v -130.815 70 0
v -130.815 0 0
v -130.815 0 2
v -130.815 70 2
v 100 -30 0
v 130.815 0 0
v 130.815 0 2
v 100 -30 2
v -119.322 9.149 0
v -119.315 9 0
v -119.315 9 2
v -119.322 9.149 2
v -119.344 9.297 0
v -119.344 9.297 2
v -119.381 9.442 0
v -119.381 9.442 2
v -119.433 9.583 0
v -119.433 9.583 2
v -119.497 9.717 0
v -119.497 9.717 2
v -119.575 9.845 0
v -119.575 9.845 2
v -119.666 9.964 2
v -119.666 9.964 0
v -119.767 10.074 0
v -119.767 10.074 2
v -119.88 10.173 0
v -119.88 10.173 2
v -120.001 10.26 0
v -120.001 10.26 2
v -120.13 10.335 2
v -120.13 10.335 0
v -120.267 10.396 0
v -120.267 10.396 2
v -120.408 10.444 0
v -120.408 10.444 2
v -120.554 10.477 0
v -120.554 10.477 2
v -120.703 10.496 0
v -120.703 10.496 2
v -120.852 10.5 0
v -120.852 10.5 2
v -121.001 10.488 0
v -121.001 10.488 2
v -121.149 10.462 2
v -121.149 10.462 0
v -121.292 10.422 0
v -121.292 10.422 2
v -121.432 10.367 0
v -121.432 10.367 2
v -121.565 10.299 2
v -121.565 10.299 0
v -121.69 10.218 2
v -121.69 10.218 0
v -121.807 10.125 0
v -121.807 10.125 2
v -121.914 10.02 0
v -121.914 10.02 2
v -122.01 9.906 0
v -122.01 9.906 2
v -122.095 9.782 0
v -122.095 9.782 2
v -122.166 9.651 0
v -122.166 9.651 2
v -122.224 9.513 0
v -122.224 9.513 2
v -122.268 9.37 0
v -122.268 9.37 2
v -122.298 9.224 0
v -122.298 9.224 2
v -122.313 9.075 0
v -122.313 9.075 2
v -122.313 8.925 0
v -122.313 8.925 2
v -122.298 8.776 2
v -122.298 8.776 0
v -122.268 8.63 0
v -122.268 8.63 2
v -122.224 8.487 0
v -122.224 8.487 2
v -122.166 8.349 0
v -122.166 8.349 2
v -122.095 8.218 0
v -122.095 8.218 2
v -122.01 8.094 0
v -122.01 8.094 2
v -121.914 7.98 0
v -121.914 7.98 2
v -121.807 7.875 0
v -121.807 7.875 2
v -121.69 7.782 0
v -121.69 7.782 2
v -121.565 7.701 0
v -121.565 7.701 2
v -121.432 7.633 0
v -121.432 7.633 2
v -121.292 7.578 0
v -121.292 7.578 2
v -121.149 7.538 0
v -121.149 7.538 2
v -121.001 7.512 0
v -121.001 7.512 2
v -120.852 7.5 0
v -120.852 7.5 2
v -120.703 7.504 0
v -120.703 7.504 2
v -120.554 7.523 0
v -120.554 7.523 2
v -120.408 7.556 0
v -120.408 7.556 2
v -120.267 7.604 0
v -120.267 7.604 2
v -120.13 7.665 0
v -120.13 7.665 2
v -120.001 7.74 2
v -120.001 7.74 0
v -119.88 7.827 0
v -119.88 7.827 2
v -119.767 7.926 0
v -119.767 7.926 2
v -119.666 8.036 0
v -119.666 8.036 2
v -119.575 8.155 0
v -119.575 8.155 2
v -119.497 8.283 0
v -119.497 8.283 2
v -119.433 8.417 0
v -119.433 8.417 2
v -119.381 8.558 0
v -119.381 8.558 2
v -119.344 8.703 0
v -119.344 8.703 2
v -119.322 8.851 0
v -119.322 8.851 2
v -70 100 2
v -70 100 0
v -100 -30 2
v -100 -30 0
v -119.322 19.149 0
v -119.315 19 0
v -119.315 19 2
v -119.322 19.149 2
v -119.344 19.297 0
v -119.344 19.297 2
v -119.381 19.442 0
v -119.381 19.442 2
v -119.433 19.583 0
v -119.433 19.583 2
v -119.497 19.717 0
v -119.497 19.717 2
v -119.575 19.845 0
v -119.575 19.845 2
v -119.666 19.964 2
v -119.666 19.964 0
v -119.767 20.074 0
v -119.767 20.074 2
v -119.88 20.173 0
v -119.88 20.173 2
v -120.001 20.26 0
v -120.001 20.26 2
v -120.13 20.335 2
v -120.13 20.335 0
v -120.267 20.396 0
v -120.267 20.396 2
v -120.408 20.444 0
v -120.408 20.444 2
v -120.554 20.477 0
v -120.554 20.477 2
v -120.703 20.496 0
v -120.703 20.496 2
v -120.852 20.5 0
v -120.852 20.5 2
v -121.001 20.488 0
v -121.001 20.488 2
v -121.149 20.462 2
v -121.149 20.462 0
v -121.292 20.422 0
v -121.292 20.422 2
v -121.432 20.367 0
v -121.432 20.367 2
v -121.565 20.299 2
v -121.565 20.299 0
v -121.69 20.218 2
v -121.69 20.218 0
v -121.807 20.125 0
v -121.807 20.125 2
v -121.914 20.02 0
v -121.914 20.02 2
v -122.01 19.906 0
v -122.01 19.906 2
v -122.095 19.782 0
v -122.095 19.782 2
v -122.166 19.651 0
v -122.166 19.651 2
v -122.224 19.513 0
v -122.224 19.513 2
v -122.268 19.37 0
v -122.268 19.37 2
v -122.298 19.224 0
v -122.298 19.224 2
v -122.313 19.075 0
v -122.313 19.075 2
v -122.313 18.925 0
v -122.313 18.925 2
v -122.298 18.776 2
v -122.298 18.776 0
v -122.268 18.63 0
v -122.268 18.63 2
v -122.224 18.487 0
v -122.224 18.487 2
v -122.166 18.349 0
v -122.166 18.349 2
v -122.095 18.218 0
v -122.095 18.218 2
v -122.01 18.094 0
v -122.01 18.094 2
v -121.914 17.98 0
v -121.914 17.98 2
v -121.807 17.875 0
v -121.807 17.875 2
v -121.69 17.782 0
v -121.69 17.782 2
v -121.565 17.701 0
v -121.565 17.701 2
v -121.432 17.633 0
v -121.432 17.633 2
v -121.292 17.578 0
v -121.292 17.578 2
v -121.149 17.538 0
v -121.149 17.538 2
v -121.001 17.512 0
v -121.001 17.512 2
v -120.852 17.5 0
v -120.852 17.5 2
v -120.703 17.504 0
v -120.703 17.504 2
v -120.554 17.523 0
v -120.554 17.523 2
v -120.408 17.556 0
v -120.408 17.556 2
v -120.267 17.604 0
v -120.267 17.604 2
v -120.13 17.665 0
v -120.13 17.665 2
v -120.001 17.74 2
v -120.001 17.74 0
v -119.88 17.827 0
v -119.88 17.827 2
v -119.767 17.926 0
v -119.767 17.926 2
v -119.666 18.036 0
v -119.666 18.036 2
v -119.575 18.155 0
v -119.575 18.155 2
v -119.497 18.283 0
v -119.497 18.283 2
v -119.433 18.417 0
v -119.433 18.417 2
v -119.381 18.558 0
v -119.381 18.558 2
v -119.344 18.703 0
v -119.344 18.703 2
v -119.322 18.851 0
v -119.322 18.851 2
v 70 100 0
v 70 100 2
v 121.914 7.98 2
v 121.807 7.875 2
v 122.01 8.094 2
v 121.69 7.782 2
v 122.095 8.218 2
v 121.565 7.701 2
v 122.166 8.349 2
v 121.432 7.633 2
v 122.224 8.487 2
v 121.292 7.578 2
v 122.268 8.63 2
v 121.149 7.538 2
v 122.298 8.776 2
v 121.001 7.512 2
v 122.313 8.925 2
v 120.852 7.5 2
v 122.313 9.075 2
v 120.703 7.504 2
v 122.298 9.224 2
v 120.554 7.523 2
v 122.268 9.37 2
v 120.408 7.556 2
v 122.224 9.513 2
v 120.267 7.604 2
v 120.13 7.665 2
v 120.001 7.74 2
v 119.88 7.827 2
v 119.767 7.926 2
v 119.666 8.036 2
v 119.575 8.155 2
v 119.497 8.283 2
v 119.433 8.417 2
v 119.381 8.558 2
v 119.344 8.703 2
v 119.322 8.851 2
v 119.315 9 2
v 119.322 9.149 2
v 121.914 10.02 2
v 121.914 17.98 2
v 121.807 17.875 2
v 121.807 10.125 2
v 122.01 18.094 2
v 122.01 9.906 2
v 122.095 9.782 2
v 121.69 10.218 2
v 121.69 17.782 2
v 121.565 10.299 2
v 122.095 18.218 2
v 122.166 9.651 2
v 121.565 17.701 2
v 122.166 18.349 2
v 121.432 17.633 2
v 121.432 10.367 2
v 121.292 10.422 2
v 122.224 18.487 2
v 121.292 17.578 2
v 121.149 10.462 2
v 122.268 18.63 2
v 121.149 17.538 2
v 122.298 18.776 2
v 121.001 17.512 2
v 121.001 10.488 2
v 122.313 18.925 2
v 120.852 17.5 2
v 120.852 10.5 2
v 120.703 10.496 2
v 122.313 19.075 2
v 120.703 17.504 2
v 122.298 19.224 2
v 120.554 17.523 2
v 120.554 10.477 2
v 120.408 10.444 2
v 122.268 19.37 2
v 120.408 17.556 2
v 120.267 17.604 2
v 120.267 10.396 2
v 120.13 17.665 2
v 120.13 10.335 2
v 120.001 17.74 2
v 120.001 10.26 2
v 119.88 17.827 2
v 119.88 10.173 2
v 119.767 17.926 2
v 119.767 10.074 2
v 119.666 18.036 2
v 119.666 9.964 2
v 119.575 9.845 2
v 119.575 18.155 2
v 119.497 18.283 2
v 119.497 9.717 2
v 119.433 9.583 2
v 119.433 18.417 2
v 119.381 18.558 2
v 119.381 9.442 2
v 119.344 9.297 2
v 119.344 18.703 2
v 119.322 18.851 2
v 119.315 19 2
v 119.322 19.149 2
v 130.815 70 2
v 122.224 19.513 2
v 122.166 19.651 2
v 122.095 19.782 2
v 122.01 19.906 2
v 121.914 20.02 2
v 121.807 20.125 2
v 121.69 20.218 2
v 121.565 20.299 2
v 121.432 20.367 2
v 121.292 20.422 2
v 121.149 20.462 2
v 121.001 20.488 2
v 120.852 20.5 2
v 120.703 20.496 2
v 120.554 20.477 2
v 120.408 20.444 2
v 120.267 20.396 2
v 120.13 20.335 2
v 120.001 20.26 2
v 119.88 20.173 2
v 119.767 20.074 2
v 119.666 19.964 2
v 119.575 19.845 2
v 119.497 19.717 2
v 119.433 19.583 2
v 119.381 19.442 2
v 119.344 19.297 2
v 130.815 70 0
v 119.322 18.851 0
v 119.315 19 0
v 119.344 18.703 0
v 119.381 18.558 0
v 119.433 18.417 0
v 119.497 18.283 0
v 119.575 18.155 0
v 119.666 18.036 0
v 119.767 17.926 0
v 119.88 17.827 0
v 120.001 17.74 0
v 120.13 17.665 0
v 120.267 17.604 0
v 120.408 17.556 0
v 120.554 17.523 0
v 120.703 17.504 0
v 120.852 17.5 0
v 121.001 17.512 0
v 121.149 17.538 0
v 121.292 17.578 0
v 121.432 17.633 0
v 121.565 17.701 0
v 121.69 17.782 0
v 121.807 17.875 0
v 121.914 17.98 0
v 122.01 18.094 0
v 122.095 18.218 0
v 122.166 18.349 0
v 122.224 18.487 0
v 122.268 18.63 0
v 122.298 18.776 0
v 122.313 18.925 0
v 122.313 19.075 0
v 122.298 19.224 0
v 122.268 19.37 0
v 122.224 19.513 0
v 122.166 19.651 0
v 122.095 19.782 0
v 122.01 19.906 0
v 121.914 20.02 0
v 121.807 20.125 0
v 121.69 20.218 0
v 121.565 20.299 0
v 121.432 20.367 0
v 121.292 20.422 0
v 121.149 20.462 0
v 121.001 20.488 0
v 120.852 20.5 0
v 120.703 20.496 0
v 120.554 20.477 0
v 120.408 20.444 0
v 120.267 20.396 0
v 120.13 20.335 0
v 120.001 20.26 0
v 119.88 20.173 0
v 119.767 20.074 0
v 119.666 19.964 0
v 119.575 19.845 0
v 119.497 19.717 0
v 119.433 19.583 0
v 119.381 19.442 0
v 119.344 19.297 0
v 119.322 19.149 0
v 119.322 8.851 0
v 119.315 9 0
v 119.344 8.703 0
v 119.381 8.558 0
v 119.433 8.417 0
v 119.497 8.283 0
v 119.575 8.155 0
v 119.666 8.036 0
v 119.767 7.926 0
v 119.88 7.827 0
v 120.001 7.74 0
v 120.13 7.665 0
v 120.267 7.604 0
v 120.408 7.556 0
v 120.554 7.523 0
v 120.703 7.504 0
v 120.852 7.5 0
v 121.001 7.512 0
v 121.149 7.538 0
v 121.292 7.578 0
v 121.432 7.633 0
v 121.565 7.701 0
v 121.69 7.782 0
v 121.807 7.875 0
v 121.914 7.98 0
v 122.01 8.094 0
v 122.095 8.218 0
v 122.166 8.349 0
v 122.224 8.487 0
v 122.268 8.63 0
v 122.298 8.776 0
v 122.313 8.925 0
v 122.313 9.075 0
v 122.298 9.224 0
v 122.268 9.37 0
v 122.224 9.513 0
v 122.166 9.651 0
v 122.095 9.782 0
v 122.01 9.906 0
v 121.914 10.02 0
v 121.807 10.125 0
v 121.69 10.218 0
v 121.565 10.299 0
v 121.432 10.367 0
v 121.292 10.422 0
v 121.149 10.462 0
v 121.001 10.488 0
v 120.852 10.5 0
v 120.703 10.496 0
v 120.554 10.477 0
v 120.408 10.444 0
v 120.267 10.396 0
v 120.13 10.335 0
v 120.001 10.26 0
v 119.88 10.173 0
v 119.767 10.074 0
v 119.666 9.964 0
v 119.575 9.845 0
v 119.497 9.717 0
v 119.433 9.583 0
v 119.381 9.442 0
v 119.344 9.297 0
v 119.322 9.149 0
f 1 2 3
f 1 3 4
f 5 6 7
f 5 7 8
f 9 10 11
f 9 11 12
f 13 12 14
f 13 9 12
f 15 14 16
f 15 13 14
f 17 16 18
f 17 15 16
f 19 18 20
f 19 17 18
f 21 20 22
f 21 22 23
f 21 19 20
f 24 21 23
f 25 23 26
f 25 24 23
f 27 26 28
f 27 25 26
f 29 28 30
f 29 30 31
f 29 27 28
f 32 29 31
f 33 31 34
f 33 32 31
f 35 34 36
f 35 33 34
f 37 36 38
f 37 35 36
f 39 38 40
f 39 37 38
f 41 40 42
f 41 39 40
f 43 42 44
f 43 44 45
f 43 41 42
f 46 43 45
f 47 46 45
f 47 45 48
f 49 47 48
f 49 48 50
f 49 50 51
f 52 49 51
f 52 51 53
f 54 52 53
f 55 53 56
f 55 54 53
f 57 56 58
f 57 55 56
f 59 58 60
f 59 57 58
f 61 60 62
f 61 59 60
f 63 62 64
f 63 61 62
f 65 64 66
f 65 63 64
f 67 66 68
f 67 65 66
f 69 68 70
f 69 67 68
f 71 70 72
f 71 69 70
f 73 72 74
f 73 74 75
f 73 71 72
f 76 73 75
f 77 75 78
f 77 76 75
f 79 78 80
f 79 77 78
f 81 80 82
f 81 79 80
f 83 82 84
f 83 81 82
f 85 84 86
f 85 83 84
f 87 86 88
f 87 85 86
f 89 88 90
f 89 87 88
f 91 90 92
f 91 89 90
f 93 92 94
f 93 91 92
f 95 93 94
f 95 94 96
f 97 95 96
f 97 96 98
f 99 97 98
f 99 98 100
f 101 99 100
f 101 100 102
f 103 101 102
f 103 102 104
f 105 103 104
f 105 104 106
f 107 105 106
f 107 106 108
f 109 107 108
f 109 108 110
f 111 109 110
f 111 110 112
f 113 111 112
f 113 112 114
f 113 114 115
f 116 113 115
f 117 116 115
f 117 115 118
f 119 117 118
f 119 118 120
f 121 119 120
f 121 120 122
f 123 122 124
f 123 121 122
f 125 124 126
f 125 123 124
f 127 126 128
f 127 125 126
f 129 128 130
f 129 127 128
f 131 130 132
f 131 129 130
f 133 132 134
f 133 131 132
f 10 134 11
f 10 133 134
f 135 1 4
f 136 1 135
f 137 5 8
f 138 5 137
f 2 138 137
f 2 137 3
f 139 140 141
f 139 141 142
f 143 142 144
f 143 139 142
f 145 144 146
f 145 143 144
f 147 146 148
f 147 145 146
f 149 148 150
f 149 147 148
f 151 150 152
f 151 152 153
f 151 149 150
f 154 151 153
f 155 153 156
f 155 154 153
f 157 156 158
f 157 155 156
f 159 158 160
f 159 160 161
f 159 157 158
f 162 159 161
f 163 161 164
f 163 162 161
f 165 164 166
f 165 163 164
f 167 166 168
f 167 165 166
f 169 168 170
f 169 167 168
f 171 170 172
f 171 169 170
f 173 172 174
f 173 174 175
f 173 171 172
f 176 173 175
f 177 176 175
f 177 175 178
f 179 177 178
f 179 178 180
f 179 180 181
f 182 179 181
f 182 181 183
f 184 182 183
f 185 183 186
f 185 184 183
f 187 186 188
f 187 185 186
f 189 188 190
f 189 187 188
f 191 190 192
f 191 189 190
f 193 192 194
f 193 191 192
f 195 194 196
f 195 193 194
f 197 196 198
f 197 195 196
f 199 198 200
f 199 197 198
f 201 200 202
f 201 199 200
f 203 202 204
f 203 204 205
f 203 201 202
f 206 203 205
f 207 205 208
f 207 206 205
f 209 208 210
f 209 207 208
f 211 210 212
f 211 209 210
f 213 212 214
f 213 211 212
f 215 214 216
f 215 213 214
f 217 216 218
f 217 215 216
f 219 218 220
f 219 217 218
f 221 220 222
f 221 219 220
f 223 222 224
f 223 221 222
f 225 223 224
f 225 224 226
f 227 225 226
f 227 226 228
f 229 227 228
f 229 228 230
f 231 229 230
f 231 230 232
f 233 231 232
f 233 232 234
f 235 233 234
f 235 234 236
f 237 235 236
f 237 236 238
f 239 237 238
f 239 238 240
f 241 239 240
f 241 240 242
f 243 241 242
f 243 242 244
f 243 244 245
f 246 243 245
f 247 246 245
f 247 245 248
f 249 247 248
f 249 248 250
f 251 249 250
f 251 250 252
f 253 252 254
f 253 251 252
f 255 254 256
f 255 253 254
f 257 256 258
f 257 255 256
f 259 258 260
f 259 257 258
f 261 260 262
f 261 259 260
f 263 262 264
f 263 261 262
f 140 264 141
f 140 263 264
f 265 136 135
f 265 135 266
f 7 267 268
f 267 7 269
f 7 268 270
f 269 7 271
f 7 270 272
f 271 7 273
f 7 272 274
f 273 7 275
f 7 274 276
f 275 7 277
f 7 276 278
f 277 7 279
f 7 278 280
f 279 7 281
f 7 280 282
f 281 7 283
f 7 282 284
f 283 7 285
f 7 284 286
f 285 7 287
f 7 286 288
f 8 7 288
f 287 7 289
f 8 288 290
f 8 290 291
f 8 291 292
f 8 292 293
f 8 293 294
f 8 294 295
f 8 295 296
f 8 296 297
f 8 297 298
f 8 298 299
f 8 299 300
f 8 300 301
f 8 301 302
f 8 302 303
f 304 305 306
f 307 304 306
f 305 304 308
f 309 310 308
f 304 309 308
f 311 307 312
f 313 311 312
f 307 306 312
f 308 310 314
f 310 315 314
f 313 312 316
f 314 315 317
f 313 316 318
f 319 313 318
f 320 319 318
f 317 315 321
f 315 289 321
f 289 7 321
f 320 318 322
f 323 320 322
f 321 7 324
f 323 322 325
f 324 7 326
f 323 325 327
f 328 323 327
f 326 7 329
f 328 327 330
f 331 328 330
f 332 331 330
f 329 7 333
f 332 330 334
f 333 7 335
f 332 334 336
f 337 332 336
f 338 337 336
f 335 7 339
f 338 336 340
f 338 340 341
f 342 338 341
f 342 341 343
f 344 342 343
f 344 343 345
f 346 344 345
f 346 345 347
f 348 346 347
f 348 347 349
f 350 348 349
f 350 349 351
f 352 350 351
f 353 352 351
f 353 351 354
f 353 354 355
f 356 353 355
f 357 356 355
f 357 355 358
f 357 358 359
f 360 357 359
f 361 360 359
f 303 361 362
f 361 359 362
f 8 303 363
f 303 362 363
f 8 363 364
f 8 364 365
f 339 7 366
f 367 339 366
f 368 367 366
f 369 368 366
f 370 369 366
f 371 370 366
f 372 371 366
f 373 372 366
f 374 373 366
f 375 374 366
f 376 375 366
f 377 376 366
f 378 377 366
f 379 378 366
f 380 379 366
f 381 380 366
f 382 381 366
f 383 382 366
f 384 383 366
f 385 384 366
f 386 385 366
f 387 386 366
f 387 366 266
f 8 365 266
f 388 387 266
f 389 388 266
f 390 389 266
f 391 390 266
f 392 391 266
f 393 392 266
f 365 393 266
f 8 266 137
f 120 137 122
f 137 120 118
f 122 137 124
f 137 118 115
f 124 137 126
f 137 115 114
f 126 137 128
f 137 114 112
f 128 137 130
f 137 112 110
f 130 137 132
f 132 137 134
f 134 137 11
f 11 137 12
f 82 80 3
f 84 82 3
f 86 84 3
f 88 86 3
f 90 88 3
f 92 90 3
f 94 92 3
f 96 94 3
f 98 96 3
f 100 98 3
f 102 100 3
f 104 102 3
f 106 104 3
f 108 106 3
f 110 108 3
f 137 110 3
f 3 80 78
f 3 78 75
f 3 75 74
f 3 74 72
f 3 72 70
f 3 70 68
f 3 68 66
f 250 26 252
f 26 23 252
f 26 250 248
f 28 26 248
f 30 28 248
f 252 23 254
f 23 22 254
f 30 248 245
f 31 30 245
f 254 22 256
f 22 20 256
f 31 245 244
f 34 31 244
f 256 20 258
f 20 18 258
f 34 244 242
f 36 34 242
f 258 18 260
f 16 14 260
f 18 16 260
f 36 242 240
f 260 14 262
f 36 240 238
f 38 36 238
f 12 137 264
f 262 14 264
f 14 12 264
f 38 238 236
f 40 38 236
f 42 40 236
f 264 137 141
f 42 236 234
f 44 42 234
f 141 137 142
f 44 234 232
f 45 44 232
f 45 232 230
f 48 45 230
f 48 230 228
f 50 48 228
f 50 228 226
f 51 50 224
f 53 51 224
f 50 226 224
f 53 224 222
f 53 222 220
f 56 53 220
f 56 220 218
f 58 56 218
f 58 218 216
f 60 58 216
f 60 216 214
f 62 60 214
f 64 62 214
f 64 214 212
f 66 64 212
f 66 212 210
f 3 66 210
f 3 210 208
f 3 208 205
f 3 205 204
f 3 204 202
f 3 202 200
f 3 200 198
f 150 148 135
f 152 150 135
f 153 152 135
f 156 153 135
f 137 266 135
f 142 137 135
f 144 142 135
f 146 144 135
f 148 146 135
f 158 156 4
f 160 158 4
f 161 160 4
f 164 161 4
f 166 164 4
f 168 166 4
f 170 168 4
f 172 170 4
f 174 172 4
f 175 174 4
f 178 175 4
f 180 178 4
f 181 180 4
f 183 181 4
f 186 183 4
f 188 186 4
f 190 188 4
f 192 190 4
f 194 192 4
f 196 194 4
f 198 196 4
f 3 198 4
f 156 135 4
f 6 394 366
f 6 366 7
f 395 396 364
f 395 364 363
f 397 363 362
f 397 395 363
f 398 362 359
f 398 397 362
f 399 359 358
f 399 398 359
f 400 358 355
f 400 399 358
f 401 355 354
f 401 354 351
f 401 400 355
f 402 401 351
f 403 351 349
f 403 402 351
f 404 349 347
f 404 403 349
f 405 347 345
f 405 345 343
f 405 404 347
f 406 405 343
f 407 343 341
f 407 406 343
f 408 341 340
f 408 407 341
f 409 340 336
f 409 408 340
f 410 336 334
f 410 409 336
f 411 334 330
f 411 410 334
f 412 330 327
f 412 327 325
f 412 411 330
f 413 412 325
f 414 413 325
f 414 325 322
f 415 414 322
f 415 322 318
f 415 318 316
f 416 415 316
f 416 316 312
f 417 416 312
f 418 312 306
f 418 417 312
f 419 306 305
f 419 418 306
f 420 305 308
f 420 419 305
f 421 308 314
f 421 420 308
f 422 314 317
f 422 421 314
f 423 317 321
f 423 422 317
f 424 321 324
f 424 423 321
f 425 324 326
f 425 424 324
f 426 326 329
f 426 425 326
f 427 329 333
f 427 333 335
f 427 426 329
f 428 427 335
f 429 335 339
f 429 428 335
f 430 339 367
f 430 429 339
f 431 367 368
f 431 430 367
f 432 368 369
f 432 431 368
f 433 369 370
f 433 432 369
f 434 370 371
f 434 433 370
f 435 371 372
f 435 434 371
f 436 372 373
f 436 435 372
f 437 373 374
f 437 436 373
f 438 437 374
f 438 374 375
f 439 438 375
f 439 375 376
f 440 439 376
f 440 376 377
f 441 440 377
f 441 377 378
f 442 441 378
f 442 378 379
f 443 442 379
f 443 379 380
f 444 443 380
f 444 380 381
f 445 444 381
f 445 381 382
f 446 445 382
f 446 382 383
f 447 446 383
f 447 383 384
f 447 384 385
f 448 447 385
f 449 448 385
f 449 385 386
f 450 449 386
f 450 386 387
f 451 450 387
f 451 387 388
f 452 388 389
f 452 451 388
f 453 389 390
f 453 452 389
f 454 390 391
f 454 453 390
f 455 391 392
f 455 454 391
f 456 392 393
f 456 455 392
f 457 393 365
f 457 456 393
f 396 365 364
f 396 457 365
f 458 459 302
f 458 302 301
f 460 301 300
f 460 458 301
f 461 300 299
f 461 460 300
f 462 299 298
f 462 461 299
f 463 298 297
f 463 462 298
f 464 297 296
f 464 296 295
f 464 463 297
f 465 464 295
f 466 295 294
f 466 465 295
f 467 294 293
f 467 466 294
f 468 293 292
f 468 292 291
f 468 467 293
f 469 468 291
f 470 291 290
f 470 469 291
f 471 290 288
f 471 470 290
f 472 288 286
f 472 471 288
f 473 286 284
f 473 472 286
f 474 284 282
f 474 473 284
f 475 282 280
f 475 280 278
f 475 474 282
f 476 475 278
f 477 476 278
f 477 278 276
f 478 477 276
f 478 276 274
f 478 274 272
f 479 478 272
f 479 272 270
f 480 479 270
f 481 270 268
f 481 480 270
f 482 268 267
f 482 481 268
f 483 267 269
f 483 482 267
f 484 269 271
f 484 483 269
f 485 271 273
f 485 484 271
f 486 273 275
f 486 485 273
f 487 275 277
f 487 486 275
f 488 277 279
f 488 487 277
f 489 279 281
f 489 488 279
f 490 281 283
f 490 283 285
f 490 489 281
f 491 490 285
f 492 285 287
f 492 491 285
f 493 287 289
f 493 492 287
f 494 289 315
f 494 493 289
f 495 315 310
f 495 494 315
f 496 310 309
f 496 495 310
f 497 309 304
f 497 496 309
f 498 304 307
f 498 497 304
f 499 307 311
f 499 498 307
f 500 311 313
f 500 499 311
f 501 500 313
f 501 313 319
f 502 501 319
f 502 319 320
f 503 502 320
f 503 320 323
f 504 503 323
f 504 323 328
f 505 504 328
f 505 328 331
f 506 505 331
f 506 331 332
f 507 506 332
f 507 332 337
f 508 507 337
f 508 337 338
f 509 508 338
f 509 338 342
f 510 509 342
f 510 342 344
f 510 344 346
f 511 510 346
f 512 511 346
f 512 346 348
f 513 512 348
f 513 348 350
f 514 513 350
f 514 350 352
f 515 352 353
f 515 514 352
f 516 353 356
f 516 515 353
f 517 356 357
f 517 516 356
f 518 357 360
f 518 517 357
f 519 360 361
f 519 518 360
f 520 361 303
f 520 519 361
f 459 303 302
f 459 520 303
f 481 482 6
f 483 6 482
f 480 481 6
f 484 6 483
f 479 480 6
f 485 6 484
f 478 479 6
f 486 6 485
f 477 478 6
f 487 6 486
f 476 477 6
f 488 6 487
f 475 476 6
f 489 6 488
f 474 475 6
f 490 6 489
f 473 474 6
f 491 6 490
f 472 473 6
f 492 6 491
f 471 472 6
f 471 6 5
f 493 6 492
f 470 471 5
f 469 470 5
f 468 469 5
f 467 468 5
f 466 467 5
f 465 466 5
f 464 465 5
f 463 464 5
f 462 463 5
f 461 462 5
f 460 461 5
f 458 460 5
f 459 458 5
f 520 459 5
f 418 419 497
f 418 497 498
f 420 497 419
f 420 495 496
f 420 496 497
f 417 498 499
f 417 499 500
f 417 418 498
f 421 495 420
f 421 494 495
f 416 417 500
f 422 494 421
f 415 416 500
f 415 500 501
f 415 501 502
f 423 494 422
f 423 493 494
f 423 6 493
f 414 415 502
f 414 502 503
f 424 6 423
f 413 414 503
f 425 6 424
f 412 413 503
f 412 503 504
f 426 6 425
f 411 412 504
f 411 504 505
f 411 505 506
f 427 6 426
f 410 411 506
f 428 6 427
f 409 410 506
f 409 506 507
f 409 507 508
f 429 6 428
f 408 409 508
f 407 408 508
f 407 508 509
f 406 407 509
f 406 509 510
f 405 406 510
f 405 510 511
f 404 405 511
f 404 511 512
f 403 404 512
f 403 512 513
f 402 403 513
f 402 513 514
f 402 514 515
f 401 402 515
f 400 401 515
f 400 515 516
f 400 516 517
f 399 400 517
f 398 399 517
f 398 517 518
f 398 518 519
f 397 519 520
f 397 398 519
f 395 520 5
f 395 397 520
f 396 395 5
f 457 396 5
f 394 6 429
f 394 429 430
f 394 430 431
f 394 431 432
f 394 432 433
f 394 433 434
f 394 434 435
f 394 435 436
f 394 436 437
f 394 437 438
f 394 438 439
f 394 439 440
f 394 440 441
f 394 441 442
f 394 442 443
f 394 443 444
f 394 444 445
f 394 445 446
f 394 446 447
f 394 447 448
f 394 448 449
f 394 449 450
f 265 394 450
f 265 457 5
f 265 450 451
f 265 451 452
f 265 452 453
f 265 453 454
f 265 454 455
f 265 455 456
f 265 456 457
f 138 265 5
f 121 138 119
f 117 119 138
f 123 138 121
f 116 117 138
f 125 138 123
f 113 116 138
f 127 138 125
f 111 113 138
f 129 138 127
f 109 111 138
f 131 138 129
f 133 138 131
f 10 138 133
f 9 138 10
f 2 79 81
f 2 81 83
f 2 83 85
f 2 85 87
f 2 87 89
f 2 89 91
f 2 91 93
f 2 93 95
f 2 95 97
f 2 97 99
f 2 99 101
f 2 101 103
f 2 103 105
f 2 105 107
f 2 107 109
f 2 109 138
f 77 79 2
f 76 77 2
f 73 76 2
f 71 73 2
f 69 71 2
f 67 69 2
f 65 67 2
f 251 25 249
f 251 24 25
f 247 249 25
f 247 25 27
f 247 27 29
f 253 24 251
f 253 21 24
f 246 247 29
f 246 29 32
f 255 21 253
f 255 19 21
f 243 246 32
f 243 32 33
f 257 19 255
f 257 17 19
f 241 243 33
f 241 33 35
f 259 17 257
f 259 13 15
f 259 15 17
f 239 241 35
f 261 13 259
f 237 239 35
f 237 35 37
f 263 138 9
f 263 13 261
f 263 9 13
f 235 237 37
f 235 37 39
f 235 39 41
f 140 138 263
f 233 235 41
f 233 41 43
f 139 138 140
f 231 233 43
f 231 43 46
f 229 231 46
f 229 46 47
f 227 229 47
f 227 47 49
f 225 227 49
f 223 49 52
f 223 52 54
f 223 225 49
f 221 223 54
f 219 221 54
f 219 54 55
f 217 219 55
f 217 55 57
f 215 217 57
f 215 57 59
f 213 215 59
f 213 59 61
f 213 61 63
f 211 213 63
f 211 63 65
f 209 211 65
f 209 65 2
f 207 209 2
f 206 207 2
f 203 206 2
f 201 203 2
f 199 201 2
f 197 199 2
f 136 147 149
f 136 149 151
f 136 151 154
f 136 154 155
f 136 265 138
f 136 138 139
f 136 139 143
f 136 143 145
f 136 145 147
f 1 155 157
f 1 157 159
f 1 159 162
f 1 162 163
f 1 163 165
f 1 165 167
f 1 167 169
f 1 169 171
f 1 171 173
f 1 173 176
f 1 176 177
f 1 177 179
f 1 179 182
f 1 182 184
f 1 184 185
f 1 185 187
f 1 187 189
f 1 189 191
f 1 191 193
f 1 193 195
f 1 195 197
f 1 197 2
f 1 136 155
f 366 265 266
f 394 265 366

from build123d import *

# Parameters (mm, degrees)
SKETCH_1_R      = 1.5
EXTRUDE_1_DEPTH = 2


with BuildPart() as part:
    # 草图1 → 凸台-拉伸1 (new body)
    with BuildSketch(Plane.XY):
        Polygon((-130.81475452, 0), (-130.81475452, 70), (-70, 100), (70, 100), (130.81475452, 70), (130.81475452, 0), (100, -30), (-100, -30), align=None)
        with Locations((-120.81475452, 9)):
            Circle(SKETCH_1_R, mode=Mode.SUBTRACT)
        with Locations(Location((120.81475452, 9, 0), (0, 0, 180))):
            Circle(SKETCH_1_R, mode=Mode.SUBTRACT)
        with Locations((-120.81475452, 19)):
            Circle(SKETCH_1_R, mode=Mode.SUBTRACT)
        with Locations(Location((120.81475452, 19, 0), (0, 0, 180))):
            Circle(SKETCH_1_R, mode=Mode.SUBTRACT)
    extrude(amount=EXTRUDE_1_DEPTH)


solid = part.part
